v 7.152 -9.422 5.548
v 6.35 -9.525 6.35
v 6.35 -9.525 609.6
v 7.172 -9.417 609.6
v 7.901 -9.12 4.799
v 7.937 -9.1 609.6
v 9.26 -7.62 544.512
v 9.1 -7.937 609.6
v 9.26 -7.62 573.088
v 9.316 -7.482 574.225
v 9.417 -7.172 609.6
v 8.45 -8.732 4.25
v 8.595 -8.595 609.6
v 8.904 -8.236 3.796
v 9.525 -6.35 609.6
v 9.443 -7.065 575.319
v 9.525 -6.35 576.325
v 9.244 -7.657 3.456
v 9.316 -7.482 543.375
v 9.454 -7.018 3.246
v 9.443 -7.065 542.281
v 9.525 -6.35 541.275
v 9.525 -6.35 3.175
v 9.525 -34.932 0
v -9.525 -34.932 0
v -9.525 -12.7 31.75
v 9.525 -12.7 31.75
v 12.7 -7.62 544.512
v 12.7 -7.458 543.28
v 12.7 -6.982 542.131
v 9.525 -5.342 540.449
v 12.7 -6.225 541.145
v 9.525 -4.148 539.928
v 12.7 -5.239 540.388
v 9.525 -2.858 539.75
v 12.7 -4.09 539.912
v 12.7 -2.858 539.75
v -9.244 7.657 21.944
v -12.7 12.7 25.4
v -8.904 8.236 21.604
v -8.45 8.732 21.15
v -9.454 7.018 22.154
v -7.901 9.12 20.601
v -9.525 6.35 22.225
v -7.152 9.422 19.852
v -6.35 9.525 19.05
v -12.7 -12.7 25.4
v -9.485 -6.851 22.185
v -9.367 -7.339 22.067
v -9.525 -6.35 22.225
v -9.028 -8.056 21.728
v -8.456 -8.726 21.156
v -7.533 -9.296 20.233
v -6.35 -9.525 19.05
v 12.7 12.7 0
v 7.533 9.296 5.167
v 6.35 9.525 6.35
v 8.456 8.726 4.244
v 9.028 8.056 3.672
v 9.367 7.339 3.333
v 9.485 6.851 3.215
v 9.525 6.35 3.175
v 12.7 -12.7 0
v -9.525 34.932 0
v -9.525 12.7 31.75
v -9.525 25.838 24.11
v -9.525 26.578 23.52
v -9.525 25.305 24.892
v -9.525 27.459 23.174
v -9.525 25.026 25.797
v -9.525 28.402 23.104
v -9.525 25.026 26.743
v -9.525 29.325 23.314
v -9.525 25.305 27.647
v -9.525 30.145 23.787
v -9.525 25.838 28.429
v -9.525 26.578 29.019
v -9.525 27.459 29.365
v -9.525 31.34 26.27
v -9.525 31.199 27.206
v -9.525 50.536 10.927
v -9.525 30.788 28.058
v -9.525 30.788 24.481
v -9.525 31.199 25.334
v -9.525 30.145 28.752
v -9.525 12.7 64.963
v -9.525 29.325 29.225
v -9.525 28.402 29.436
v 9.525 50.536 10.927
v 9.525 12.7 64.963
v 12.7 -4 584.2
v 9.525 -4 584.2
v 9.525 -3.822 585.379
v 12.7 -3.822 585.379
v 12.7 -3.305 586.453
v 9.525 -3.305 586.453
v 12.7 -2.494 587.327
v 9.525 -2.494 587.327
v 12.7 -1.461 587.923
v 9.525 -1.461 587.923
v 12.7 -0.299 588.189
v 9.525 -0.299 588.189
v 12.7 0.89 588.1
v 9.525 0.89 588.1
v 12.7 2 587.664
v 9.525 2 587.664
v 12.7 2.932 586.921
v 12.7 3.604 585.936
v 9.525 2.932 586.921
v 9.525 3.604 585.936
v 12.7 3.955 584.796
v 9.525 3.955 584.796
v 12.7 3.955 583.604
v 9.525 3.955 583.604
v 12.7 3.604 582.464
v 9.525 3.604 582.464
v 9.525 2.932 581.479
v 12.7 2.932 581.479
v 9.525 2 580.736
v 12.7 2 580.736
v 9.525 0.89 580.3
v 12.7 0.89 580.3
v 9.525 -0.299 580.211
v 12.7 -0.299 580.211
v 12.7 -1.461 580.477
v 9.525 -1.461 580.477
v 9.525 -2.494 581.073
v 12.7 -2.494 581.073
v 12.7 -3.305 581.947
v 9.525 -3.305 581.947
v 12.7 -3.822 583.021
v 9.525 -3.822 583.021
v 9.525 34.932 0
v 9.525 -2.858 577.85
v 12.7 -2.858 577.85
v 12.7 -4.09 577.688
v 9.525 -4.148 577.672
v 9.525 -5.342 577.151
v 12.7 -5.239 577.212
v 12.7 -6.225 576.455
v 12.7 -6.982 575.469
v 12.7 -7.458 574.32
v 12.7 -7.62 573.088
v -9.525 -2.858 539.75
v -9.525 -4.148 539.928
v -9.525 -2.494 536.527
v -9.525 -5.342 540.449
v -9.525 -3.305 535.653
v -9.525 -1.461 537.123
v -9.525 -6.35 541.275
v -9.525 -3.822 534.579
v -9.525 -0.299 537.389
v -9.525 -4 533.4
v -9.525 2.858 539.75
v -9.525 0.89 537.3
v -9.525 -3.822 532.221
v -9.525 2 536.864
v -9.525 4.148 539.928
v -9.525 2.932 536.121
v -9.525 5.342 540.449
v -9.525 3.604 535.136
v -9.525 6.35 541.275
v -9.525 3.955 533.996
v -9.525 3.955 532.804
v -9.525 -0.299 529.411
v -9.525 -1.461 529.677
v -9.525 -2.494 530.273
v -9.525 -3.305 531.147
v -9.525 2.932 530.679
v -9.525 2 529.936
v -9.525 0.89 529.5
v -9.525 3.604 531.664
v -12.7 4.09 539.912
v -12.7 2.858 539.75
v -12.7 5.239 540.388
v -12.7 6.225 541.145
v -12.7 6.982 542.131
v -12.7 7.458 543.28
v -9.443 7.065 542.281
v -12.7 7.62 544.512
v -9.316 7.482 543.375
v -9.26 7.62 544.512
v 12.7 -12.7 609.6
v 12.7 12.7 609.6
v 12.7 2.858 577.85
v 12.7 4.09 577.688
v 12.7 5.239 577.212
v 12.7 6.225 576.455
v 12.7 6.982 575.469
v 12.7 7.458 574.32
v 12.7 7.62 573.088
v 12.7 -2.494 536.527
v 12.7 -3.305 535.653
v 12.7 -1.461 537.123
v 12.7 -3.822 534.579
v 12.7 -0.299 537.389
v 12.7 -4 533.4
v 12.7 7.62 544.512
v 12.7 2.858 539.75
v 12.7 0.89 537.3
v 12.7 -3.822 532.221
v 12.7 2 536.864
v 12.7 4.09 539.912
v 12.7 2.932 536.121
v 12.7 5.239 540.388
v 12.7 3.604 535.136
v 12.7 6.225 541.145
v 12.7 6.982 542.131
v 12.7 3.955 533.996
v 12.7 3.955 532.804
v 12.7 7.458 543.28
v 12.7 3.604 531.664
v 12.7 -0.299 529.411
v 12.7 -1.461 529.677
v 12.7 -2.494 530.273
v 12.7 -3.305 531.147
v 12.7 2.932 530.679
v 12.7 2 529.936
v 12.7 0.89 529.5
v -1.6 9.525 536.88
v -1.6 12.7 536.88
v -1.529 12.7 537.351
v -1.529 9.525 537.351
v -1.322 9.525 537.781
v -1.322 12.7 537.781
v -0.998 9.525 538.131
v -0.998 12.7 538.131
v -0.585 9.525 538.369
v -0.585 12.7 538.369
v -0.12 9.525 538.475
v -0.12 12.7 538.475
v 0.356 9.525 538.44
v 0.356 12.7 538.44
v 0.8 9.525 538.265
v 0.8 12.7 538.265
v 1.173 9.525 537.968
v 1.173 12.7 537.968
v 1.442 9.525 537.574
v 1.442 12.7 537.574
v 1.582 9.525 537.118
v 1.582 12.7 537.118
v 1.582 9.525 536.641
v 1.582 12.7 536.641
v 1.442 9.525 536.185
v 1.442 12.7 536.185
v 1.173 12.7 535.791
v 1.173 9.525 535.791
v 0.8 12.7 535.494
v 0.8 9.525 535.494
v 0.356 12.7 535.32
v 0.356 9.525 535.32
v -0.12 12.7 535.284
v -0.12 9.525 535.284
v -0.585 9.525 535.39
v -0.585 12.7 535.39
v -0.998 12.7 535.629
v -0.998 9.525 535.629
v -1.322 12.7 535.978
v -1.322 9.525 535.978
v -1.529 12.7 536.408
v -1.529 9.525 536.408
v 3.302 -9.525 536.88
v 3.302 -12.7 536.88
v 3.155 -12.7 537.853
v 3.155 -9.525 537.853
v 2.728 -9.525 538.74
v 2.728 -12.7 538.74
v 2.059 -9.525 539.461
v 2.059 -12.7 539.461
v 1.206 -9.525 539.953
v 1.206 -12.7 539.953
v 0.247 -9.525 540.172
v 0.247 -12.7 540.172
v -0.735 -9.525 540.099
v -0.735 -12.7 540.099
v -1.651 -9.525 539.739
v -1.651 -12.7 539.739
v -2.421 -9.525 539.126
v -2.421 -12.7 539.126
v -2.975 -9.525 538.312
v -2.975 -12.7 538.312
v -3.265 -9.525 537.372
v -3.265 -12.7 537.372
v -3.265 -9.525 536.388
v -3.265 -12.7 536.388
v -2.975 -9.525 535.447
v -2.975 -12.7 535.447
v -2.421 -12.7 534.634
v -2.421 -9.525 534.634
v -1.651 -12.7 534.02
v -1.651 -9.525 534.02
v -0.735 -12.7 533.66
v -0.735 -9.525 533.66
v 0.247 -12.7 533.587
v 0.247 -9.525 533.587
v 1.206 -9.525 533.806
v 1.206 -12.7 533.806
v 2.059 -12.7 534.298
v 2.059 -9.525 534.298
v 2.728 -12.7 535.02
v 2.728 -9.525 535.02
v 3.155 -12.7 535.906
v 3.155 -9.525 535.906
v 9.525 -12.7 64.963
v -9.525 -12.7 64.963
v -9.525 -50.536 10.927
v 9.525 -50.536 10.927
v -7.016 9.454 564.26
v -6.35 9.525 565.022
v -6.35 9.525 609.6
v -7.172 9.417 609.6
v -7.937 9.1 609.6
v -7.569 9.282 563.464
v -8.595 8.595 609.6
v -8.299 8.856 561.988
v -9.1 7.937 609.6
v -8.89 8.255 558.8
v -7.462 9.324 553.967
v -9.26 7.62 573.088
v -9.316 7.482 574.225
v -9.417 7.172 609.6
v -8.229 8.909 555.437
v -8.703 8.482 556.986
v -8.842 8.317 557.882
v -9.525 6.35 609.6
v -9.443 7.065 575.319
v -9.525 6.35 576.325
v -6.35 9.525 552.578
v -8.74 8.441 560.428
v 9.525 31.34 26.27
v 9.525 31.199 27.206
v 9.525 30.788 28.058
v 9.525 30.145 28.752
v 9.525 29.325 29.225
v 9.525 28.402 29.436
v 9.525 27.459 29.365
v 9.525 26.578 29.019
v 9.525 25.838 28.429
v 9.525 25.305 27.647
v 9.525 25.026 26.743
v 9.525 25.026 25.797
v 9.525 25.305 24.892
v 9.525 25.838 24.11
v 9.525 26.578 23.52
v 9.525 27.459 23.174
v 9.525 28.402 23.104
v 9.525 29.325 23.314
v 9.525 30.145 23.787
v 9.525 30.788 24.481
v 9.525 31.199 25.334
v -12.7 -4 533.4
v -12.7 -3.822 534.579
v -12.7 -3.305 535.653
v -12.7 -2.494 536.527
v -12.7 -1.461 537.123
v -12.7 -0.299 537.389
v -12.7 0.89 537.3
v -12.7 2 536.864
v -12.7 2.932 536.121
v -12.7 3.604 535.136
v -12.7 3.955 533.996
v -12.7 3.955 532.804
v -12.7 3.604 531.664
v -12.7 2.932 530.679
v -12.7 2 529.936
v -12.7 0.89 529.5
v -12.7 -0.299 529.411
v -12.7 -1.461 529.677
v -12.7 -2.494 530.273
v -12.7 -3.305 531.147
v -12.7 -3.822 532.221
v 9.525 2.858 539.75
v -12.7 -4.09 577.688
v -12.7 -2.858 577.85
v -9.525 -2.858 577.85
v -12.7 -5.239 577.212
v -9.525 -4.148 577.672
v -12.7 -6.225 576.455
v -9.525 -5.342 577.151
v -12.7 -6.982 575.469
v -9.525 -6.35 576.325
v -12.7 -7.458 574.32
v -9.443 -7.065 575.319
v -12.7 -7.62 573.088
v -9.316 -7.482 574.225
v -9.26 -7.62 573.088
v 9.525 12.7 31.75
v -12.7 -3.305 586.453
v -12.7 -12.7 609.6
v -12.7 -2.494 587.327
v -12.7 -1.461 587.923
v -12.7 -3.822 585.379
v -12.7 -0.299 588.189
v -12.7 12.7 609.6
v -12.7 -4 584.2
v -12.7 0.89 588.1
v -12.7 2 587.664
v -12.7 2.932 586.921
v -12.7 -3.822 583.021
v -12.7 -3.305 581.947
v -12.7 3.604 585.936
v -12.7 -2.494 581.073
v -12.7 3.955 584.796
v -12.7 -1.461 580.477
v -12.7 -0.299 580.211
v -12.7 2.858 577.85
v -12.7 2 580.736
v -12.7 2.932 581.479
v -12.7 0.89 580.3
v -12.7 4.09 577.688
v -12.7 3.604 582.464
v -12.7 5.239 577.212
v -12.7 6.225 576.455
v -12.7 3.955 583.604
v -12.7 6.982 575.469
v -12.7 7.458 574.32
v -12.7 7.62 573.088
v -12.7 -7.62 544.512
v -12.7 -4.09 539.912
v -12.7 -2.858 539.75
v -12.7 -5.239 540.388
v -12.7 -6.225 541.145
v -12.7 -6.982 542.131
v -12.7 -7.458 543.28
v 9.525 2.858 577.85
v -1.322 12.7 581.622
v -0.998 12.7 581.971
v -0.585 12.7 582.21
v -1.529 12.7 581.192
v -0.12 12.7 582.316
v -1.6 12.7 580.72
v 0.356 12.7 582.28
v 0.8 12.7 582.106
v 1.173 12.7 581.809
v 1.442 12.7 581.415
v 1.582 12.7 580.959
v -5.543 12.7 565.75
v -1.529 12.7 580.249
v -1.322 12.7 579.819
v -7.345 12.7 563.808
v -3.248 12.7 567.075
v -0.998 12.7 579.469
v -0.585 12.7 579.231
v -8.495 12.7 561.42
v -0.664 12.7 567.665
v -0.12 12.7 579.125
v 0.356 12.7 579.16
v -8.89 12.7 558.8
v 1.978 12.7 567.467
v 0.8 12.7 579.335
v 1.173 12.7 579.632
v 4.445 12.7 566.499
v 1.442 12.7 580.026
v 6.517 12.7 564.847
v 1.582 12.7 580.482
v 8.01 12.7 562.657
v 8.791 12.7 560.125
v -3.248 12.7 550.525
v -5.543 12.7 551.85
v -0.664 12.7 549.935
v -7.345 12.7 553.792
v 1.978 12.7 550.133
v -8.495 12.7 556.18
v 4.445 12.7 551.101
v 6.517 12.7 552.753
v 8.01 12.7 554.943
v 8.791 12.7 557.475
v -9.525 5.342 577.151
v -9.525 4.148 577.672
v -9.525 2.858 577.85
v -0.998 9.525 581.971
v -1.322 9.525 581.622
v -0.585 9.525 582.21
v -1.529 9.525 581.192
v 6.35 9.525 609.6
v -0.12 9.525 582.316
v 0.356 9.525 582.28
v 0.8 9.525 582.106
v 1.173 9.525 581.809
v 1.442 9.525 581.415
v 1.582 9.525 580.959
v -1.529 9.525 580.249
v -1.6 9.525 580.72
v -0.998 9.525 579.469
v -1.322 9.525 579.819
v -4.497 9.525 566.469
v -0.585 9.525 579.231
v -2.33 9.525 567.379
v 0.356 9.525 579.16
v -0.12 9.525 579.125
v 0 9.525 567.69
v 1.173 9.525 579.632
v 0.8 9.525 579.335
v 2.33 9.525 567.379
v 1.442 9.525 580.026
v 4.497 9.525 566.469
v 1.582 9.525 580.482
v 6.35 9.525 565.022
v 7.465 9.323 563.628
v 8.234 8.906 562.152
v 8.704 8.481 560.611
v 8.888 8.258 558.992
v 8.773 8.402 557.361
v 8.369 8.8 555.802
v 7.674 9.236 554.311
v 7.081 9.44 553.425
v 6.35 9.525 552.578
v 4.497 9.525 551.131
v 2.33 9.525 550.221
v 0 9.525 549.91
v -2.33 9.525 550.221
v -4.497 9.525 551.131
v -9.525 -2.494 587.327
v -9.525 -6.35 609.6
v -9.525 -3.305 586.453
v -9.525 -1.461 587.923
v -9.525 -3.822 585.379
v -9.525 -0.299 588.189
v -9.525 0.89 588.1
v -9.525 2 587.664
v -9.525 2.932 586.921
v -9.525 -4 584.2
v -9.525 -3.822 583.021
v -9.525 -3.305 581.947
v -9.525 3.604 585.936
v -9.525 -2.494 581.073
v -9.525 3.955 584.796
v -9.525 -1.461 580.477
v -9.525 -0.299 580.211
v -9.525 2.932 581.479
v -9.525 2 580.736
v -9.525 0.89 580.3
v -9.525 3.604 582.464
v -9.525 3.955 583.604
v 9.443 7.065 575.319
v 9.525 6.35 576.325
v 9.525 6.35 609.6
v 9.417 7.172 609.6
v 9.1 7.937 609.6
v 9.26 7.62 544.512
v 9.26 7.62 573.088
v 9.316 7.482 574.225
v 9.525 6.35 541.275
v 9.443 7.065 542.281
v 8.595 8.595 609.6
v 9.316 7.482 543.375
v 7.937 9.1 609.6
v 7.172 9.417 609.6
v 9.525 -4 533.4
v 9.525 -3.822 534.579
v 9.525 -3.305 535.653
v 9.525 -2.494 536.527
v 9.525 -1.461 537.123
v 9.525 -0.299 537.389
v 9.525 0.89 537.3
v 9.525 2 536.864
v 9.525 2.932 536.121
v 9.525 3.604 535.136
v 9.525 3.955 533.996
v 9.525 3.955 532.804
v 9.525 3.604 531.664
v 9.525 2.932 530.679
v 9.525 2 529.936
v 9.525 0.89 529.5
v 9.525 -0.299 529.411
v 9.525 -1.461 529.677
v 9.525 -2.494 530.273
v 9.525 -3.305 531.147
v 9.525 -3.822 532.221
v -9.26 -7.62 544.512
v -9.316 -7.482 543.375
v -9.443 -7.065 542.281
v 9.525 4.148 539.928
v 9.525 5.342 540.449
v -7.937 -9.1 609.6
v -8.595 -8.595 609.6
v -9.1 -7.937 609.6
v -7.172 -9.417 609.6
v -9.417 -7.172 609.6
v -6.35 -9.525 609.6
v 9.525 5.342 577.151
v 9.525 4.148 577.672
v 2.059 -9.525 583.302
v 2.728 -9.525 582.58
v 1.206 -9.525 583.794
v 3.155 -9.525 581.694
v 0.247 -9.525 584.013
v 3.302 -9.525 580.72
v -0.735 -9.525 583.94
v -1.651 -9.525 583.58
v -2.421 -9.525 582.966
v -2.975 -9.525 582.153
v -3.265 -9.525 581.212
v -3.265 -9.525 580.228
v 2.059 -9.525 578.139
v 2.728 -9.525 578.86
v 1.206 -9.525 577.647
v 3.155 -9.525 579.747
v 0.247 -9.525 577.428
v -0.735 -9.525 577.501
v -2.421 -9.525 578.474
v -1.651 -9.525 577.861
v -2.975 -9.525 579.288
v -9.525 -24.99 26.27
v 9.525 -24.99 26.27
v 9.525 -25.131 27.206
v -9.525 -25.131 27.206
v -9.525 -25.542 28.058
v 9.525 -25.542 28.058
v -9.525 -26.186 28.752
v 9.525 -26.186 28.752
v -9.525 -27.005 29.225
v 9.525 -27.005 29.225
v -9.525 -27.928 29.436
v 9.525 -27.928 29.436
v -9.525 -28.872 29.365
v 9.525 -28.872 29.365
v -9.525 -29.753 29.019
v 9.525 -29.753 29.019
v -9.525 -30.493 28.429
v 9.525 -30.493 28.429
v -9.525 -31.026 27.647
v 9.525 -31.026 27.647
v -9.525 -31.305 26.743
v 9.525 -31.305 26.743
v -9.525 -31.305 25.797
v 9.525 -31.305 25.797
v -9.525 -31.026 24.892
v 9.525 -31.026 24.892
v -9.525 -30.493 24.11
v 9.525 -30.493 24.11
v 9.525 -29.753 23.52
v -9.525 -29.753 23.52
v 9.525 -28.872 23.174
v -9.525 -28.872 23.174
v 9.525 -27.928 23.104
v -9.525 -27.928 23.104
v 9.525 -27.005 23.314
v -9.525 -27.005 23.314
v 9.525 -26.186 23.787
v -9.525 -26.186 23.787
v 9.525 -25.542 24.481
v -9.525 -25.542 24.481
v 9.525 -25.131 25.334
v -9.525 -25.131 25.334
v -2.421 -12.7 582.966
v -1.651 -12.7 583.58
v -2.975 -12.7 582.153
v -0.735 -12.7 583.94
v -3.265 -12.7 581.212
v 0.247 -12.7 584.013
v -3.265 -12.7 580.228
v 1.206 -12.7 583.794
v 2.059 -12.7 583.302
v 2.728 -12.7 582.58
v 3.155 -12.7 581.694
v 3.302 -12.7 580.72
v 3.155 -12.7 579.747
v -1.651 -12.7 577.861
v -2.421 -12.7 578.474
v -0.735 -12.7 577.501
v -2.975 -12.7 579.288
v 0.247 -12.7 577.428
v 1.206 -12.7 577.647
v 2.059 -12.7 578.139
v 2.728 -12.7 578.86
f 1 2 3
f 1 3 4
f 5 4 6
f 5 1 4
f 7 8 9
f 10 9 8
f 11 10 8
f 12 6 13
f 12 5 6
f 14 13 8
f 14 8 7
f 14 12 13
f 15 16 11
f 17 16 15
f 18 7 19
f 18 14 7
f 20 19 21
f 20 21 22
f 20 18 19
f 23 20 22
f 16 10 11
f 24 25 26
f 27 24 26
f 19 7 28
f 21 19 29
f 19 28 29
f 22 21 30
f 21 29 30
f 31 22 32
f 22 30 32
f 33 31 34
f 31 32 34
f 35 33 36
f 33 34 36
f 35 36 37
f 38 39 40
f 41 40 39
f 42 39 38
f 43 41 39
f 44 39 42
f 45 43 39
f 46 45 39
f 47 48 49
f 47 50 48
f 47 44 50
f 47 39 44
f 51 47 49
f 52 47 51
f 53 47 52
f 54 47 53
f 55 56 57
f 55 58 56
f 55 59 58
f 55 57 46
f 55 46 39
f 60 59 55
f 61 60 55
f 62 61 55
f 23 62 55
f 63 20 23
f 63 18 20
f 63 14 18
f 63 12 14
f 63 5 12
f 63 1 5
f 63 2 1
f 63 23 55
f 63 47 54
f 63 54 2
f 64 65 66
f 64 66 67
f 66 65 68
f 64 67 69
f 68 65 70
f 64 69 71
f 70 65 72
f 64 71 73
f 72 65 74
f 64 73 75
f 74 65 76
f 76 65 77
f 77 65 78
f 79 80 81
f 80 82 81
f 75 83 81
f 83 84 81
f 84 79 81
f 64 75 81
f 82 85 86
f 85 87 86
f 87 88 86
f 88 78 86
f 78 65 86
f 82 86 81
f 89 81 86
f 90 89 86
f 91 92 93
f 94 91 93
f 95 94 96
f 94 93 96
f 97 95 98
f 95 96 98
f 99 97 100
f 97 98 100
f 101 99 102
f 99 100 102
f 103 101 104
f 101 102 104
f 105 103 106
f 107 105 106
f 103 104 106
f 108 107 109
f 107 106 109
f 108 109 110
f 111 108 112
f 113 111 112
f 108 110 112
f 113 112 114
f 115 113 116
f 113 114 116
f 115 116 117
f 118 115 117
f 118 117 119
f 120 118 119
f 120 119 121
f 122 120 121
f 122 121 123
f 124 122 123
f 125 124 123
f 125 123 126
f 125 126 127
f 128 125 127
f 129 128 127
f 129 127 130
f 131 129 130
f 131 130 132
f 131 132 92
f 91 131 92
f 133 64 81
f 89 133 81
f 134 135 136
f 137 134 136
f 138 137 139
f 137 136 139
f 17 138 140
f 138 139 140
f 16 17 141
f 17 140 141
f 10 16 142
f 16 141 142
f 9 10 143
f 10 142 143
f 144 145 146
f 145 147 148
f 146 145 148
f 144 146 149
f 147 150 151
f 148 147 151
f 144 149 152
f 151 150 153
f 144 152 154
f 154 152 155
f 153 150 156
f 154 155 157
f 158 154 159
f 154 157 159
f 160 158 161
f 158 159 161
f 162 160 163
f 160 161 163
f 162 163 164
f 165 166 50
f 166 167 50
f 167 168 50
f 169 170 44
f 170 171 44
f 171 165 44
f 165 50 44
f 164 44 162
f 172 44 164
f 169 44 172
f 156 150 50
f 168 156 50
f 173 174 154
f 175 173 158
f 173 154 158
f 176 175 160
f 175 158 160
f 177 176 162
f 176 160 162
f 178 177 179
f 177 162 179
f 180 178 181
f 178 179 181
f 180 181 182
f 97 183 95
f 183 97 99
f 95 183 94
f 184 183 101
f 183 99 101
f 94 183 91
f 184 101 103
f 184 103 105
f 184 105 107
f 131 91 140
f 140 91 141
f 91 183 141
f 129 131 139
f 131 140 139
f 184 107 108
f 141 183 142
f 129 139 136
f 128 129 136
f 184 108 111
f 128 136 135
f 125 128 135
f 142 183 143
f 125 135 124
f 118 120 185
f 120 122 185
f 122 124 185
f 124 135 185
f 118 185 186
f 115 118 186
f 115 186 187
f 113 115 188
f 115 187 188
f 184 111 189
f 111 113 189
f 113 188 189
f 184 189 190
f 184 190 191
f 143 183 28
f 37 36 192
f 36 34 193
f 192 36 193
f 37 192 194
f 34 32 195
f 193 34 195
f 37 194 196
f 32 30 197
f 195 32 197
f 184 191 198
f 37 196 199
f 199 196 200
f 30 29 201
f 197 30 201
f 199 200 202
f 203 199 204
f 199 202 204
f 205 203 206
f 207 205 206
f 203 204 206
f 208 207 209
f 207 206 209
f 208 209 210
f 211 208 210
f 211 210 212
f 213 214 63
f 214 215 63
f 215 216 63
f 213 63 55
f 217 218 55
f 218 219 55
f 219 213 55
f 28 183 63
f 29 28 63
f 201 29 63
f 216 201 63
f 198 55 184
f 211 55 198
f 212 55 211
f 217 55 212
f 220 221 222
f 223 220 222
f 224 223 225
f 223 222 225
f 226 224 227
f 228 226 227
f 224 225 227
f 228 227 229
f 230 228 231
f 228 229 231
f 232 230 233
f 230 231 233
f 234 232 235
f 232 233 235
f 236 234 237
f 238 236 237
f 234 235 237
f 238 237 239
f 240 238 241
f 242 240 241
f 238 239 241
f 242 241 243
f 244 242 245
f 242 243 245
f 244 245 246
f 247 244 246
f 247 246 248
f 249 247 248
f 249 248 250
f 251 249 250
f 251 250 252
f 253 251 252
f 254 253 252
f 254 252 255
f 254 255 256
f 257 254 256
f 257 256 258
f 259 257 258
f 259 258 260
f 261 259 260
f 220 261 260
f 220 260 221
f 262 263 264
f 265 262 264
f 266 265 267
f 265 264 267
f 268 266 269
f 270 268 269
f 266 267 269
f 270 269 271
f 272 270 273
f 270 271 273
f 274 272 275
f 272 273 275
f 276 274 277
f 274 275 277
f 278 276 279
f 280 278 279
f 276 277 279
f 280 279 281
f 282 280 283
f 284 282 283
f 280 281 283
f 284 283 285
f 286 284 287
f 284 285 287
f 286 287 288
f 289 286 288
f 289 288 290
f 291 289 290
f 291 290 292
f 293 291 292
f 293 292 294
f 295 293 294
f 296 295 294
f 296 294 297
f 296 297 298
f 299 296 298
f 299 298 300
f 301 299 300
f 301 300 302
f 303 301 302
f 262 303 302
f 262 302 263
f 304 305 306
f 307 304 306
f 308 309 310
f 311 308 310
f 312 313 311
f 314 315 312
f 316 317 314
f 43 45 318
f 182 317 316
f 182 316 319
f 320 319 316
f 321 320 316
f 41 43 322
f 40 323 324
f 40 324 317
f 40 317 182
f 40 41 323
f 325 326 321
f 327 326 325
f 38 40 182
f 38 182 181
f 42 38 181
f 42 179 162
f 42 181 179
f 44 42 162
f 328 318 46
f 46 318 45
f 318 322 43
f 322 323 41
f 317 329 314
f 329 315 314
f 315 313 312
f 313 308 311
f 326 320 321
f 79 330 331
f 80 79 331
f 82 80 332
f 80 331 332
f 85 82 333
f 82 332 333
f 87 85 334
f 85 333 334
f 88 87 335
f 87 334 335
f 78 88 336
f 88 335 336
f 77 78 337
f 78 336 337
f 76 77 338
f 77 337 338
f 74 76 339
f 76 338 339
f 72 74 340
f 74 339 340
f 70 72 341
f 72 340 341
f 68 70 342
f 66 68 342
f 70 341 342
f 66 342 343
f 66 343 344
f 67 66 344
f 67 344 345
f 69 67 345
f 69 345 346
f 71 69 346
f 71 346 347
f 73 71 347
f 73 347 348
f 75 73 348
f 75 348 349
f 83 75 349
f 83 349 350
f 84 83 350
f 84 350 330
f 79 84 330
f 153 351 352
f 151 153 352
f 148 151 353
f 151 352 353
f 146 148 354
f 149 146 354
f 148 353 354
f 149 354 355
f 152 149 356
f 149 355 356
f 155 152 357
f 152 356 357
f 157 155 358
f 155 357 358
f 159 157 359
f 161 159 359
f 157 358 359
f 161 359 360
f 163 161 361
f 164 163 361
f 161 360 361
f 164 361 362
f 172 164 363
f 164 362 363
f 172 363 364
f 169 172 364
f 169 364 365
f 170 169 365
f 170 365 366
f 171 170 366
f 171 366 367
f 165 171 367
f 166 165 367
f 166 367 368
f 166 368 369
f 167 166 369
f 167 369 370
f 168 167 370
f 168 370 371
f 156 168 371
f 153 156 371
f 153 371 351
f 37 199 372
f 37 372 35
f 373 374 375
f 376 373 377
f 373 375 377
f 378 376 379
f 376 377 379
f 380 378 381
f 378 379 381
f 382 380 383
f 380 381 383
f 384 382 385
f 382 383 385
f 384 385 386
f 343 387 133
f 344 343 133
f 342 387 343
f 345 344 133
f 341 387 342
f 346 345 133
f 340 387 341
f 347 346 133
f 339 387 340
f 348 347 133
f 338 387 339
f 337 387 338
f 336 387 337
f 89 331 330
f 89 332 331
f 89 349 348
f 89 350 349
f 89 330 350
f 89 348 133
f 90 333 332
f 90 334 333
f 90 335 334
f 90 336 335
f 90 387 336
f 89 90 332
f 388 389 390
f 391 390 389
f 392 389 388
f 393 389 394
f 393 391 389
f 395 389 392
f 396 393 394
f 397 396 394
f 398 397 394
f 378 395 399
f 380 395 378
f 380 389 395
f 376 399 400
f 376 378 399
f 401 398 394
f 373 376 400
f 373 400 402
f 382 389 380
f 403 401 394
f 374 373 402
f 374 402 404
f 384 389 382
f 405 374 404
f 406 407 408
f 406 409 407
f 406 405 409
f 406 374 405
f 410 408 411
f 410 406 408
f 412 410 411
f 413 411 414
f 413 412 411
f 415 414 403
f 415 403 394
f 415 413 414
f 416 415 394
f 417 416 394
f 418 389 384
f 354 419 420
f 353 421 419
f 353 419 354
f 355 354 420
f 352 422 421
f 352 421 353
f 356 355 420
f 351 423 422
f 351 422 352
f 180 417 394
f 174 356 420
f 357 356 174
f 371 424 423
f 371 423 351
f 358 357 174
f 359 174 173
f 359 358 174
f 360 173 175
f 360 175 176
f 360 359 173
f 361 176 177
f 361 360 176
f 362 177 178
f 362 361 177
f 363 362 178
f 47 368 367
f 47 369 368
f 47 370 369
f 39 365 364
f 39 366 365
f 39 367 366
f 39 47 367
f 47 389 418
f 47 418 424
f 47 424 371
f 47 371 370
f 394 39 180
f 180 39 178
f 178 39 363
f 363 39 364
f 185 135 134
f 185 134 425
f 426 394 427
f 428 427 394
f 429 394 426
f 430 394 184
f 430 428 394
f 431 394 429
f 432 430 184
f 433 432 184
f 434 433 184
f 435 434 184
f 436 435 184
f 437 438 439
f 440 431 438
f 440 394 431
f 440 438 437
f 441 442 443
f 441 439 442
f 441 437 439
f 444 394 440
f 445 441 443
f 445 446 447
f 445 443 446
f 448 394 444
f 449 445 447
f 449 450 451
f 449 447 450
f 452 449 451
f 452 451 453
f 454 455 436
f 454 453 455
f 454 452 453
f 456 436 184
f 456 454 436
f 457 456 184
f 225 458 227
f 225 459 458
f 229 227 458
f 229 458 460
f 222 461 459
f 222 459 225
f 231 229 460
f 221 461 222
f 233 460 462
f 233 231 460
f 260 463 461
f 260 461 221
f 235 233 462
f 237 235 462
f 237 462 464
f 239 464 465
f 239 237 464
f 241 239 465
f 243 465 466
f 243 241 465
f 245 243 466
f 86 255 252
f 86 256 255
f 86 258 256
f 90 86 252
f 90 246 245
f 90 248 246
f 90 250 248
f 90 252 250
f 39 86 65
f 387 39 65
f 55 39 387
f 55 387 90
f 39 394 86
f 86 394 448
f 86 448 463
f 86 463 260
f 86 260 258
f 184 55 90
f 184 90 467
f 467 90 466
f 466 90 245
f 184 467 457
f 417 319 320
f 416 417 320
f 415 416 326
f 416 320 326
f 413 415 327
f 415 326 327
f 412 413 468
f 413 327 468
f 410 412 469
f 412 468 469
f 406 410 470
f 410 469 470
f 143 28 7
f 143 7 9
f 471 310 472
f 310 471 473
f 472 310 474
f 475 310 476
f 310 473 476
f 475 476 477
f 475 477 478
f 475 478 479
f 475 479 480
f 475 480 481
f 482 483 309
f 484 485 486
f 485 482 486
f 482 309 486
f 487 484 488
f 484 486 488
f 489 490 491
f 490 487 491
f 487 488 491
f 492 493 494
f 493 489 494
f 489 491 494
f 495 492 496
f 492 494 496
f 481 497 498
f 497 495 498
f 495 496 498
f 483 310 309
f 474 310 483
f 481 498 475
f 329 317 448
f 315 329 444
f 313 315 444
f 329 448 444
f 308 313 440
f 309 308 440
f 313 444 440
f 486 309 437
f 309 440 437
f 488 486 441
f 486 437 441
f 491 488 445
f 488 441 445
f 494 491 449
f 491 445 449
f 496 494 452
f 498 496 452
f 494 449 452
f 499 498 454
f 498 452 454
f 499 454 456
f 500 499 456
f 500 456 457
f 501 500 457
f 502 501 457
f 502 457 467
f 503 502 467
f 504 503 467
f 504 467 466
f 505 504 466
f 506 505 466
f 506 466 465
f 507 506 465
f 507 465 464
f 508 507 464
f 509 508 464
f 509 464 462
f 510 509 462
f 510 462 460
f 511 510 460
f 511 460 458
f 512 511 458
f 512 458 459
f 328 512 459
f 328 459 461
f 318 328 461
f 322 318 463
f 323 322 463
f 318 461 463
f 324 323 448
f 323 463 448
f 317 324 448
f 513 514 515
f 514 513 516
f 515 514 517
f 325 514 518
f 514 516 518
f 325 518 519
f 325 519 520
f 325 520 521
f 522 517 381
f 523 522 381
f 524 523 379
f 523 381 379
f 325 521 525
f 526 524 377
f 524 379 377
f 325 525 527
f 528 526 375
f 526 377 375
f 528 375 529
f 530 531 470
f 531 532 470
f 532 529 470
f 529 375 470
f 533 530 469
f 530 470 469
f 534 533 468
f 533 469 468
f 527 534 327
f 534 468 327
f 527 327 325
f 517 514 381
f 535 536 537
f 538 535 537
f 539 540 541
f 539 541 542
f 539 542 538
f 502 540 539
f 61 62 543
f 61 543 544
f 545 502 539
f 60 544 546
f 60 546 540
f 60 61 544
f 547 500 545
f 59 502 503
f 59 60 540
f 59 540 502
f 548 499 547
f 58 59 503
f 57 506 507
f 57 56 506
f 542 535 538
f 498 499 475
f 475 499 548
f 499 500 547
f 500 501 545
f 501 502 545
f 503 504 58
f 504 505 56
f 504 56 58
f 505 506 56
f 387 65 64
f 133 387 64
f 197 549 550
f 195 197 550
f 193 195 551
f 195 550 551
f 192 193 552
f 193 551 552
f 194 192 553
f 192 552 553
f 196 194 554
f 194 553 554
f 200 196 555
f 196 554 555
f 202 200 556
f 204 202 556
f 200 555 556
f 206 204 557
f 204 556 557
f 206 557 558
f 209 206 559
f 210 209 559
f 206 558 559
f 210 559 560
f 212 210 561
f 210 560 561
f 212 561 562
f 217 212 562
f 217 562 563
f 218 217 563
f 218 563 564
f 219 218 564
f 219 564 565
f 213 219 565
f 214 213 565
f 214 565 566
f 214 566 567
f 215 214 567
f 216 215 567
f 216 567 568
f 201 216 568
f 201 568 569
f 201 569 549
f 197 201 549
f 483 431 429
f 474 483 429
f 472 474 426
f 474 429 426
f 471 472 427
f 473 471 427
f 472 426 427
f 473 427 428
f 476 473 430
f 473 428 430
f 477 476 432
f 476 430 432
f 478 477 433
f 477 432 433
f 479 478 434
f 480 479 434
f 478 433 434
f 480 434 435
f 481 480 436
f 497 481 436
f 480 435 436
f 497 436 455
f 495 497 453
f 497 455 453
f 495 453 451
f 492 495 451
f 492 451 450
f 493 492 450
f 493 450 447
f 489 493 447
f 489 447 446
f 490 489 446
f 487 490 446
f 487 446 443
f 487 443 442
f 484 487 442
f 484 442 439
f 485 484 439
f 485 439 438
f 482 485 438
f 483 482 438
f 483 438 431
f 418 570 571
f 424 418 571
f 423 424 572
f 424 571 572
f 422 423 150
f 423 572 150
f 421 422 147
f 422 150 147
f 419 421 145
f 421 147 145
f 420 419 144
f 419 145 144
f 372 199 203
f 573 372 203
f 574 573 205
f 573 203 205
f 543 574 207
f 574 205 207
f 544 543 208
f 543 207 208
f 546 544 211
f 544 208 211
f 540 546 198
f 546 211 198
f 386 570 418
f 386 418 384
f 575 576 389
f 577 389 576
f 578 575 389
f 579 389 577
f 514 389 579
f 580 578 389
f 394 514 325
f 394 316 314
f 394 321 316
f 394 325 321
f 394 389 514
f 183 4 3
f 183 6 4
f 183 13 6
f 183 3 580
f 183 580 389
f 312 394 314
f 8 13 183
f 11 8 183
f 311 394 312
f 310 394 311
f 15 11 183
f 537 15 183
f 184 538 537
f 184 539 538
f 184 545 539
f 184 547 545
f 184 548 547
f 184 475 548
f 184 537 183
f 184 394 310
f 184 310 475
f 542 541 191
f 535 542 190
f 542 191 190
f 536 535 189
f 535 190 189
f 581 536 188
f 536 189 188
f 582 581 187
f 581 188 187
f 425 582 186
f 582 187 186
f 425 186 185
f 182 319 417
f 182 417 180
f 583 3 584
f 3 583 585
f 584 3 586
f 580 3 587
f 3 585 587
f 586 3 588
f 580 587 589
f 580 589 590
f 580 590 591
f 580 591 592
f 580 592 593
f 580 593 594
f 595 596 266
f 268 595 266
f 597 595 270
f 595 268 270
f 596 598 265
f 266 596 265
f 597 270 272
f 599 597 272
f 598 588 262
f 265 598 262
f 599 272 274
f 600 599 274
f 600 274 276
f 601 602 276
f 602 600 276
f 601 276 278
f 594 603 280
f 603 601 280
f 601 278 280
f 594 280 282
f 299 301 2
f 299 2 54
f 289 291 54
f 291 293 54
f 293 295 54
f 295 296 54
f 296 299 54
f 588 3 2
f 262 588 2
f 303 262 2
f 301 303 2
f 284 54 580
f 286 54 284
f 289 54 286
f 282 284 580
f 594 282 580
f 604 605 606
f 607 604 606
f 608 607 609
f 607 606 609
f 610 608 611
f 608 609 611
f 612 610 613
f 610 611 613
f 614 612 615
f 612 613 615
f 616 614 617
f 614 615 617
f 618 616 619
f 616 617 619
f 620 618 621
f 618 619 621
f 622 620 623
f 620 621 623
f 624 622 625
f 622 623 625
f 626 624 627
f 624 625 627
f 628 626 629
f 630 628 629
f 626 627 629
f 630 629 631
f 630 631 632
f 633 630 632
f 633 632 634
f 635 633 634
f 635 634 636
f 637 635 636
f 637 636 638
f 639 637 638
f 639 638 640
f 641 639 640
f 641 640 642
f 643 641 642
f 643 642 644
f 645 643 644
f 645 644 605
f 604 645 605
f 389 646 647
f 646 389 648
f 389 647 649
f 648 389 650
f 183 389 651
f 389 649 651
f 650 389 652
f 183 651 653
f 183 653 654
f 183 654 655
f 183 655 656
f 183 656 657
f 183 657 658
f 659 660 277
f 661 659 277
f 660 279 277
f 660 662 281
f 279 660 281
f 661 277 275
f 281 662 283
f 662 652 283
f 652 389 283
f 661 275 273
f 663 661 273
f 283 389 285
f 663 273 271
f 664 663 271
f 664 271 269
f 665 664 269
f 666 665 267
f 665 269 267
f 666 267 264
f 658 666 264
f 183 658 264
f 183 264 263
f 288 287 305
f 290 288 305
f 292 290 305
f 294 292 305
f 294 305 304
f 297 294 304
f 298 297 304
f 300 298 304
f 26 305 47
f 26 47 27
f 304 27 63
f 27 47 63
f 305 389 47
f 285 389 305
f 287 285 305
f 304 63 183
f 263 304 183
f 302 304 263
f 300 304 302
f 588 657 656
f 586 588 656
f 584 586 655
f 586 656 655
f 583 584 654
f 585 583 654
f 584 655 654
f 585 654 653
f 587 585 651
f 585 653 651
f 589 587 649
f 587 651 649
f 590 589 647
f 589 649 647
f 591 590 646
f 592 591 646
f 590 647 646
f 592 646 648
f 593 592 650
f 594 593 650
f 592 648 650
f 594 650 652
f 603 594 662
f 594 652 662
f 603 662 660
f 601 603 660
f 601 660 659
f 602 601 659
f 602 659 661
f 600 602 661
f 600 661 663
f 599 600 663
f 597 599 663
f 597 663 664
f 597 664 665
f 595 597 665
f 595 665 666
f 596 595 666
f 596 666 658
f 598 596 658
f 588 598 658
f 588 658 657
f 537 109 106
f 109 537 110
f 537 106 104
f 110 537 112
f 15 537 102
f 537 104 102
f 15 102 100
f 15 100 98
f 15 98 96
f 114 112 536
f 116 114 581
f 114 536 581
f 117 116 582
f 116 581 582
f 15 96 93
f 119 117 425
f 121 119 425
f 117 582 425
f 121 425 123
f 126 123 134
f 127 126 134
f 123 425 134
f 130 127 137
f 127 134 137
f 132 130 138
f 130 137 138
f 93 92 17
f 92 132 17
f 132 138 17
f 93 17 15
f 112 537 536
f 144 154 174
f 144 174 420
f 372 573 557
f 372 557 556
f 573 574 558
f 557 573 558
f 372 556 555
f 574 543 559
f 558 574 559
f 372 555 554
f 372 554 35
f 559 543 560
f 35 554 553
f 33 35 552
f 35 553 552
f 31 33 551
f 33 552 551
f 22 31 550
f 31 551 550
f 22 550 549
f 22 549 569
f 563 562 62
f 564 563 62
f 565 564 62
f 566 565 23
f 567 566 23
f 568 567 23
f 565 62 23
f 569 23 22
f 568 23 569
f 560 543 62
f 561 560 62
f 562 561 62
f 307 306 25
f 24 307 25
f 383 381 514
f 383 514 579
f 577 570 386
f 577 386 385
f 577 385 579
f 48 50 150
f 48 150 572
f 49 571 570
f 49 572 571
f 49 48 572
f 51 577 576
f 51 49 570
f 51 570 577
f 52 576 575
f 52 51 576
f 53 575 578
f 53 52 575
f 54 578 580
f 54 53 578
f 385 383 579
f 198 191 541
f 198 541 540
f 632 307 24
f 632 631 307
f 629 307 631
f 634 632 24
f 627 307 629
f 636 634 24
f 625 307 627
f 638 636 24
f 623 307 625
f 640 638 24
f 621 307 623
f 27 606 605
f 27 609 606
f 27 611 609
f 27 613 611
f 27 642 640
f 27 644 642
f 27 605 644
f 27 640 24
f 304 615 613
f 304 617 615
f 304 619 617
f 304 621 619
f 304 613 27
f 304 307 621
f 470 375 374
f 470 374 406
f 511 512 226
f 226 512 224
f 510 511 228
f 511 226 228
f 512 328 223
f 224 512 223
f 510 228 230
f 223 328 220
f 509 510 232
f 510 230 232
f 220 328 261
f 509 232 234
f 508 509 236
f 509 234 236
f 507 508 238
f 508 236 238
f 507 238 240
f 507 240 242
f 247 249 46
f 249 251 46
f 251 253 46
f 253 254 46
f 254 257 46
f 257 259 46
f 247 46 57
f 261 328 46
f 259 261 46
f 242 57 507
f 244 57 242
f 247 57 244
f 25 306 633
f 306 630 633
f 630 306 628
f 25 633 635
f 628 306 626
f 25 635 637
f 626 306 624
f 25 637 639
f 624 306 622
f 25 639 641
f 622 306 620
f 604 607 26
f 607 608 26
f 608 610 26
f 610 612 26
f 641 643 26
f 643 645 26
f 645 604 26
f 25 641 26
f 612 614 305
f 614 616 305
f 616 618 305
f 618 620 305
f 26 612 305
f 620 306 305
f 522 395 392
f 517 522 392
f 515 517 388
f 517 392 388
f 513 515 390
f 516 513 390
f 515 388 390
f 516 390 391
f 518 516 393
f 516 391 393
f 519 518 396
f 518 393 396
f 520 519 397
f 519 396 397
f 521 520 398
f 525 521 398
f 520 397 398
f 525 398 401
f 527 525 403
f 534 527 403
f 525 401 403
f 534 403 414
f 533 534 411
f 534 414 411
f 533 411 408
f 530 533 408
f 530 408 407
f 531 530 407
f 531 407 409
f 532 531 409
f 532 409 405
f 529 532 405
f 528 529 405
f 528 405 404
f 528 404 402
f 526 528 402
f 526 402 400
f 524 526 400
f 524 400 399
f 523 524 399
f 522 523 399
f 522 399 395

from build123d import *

# Parameters (mm, degrees)
SKETCH001_W     = 25.4
SKETCH001_H     = 25.4
PAD001_DEPTH    = 609.6
SKETCH002_R     = 8.89
SKETCH002_R_2   = 1.6
POCKET_DEPTH    = 5.08
SKETCH003_R     = 4
POCKET001_DEPTH = 25.401
POCKET002_DEPTH = 25.401
POCKET006_DEPTH = 25.401
PAD004_DEPTH    = 19.05
SKETCH020_R     = 3.302
POCKET012_DEPTH = 7.62
SKETCH021_R     = 3.175
POCKET013_DEPTH = 22.226


with BuildPart() as part:
    # Sketch001 → Pad001 (new body)
    with BuildSketch(Plane.XY):
        Rectangle(SKETCH001_W, SKETCH001_H)
        with BuildLine():
            ThreePointArc((-9.525, -6.35), (-8.595064, -8.595064), (-6.35, -9.525))
            Line((6.35, -9.525), (-6.35, -9.525))
            ThreePointArc((6.35, -9.525), (8.595064, -8.595064), (9.525, -6.35))
            Line((9.525, 6.35), (9.525, -6.35))
            ThreePointArc((9.525, 6.35), (8.595064, 8.595064), (6.35, 9.525))
            Line((-6.35, 9.525), (6.35, 9.525))
            ThreePointArc((-6.35, 9.525), (-8.595064, 8.595064), (-9.525, 6.35))
            Line((-9.525, -6.35), (-9.525, 6.35))
        make_face(mode=Mode.SUBTRACT)
    extrude(amount=PAD001_DEPTH)

    # Sketch002 (on Face2 of Pad001) → Pocket (cut)
    with BuildSketch(Plane(origin=(0, 12.7, 0), x_dir=(-1, 0, 0), z_dir=(0, 1, 0))):
        with Locations((0, 558.8)):
            Circle(SKETCH002_R)
        with Locations((0, 580.72031)):
            Circle(SKETCH002_R_2)
        with Locations((0, 536.87969)):
            Circle(SKETCH002_R_2)
    extrude(amount=-POCKET_DEPTH, mode=Mode.SUBTRACT)

    # Sketch003 (on Face1 of Pocket) → Pocket001 (cut, through all)
    with BuildSketch(Plane(origin=(-12.7, 0, 0), x_dir=(0, -1, 0), z_dir=(-1, 0, 0))):
        with Locations((0, 584.2)):
            Circle(SKETCH003_R)
        with Locations((0, 533.4)):
            Circle(SKETCH003_R)
    extrude(amount=-POCKET001_DEPTH, mode=Mode.SUBTRACT)

    # Sketch004 (on Face2 of Pocket001) → Pocket002 (cut, through all)
    with BuildSketch(Plane.XZ.offset(12.7)):
        Polygon((12.7, 0), (-12.7, 0), (-12.7, 25.4), align=None)
    extrude(amount=-POCKET002_DEPTH, mode=Mode.SUBTRACT)

    # Sketch010 (on Face8 of Pocket002) → Pocket006 (cut, through all)
    with BuildSketch(Plane.YZ.offset(12.7)):
        with BuildLine():
            ThreePointArc((-7.62, 544.5125), (-6.225096, 541.144904), (-2.8575, 539.75))
            Line((2.8575, 539.75), (-2.8575, 539.75))
            ThreePointArc((2.8575, 539.75), (6.225096, 541.144904), (7.62, 544.5125))
            Line((7.62, 573.0875), (7.62, 544.5125))
            ThreePointArc((7.62, 573.0875), (6.225096, 576.455096), (2.8575, 577.85))
            Line((-2.8575, 577.85), (2.8575, 577.85))
            ThreePointArc((-2.8575, 577.85), (-6.225096, 576.455096), (-7.62, 573.0875))
            Line((-7.62, 544.5125), (-7.62, 573.0875))
        make_face()
    extrude(amount=-POCKET006_DEPTH, mode=Mode.SUBTRACT)

    # Sketch014 (on DatumPlane) → Pad004 (join)
    with BuildSketch(Plane(origin=(-9.525, 0, 0), x_dir=(0, -1, 0), z_dir=(-1, 0, 0))):
        Polygon((12.7, 31.75), (12.7, 64.962661), (50.536436, 10.926631), (34.931589, 0), align=None)
        Polygon((-12.7, 64.962661), (-12.7, 31.75), (-34.931589, 0), (-50.536436, 10.926631), align=None)
    extrude(amount=-PAD004_DEPTH)

    # Sketch020 (on Face3 of Pad004) → Pocket012 (cut)
    with BuildSketch(Plane.XZ.offset(12.7)):
        with Locations((0, 536.87969)):
            Circle(SKETCH020_R)
        with Locations((0, 580.72031)):
            Circle(SKETCH020_R)
    extrude(amount=-POCKET012_DEPTH, mode=Mode.SUBTRACT)

    # Sketch021 (on Face29 of Pocket012) → Pocket013 (cut, through all)
    with BuildSketch(Plane.YZ.offset(9.525)):
        with Locations((-28.165171, 26.269777)):
            Circle(SKETCH021_R)
        with Locations((28.165171, 26.269777)):
            Circle(SKETCH021_R)
    extrude(amount=-POCKET013_DEPTH, mode=Mode.SUBTRACT)


solid = part.part
